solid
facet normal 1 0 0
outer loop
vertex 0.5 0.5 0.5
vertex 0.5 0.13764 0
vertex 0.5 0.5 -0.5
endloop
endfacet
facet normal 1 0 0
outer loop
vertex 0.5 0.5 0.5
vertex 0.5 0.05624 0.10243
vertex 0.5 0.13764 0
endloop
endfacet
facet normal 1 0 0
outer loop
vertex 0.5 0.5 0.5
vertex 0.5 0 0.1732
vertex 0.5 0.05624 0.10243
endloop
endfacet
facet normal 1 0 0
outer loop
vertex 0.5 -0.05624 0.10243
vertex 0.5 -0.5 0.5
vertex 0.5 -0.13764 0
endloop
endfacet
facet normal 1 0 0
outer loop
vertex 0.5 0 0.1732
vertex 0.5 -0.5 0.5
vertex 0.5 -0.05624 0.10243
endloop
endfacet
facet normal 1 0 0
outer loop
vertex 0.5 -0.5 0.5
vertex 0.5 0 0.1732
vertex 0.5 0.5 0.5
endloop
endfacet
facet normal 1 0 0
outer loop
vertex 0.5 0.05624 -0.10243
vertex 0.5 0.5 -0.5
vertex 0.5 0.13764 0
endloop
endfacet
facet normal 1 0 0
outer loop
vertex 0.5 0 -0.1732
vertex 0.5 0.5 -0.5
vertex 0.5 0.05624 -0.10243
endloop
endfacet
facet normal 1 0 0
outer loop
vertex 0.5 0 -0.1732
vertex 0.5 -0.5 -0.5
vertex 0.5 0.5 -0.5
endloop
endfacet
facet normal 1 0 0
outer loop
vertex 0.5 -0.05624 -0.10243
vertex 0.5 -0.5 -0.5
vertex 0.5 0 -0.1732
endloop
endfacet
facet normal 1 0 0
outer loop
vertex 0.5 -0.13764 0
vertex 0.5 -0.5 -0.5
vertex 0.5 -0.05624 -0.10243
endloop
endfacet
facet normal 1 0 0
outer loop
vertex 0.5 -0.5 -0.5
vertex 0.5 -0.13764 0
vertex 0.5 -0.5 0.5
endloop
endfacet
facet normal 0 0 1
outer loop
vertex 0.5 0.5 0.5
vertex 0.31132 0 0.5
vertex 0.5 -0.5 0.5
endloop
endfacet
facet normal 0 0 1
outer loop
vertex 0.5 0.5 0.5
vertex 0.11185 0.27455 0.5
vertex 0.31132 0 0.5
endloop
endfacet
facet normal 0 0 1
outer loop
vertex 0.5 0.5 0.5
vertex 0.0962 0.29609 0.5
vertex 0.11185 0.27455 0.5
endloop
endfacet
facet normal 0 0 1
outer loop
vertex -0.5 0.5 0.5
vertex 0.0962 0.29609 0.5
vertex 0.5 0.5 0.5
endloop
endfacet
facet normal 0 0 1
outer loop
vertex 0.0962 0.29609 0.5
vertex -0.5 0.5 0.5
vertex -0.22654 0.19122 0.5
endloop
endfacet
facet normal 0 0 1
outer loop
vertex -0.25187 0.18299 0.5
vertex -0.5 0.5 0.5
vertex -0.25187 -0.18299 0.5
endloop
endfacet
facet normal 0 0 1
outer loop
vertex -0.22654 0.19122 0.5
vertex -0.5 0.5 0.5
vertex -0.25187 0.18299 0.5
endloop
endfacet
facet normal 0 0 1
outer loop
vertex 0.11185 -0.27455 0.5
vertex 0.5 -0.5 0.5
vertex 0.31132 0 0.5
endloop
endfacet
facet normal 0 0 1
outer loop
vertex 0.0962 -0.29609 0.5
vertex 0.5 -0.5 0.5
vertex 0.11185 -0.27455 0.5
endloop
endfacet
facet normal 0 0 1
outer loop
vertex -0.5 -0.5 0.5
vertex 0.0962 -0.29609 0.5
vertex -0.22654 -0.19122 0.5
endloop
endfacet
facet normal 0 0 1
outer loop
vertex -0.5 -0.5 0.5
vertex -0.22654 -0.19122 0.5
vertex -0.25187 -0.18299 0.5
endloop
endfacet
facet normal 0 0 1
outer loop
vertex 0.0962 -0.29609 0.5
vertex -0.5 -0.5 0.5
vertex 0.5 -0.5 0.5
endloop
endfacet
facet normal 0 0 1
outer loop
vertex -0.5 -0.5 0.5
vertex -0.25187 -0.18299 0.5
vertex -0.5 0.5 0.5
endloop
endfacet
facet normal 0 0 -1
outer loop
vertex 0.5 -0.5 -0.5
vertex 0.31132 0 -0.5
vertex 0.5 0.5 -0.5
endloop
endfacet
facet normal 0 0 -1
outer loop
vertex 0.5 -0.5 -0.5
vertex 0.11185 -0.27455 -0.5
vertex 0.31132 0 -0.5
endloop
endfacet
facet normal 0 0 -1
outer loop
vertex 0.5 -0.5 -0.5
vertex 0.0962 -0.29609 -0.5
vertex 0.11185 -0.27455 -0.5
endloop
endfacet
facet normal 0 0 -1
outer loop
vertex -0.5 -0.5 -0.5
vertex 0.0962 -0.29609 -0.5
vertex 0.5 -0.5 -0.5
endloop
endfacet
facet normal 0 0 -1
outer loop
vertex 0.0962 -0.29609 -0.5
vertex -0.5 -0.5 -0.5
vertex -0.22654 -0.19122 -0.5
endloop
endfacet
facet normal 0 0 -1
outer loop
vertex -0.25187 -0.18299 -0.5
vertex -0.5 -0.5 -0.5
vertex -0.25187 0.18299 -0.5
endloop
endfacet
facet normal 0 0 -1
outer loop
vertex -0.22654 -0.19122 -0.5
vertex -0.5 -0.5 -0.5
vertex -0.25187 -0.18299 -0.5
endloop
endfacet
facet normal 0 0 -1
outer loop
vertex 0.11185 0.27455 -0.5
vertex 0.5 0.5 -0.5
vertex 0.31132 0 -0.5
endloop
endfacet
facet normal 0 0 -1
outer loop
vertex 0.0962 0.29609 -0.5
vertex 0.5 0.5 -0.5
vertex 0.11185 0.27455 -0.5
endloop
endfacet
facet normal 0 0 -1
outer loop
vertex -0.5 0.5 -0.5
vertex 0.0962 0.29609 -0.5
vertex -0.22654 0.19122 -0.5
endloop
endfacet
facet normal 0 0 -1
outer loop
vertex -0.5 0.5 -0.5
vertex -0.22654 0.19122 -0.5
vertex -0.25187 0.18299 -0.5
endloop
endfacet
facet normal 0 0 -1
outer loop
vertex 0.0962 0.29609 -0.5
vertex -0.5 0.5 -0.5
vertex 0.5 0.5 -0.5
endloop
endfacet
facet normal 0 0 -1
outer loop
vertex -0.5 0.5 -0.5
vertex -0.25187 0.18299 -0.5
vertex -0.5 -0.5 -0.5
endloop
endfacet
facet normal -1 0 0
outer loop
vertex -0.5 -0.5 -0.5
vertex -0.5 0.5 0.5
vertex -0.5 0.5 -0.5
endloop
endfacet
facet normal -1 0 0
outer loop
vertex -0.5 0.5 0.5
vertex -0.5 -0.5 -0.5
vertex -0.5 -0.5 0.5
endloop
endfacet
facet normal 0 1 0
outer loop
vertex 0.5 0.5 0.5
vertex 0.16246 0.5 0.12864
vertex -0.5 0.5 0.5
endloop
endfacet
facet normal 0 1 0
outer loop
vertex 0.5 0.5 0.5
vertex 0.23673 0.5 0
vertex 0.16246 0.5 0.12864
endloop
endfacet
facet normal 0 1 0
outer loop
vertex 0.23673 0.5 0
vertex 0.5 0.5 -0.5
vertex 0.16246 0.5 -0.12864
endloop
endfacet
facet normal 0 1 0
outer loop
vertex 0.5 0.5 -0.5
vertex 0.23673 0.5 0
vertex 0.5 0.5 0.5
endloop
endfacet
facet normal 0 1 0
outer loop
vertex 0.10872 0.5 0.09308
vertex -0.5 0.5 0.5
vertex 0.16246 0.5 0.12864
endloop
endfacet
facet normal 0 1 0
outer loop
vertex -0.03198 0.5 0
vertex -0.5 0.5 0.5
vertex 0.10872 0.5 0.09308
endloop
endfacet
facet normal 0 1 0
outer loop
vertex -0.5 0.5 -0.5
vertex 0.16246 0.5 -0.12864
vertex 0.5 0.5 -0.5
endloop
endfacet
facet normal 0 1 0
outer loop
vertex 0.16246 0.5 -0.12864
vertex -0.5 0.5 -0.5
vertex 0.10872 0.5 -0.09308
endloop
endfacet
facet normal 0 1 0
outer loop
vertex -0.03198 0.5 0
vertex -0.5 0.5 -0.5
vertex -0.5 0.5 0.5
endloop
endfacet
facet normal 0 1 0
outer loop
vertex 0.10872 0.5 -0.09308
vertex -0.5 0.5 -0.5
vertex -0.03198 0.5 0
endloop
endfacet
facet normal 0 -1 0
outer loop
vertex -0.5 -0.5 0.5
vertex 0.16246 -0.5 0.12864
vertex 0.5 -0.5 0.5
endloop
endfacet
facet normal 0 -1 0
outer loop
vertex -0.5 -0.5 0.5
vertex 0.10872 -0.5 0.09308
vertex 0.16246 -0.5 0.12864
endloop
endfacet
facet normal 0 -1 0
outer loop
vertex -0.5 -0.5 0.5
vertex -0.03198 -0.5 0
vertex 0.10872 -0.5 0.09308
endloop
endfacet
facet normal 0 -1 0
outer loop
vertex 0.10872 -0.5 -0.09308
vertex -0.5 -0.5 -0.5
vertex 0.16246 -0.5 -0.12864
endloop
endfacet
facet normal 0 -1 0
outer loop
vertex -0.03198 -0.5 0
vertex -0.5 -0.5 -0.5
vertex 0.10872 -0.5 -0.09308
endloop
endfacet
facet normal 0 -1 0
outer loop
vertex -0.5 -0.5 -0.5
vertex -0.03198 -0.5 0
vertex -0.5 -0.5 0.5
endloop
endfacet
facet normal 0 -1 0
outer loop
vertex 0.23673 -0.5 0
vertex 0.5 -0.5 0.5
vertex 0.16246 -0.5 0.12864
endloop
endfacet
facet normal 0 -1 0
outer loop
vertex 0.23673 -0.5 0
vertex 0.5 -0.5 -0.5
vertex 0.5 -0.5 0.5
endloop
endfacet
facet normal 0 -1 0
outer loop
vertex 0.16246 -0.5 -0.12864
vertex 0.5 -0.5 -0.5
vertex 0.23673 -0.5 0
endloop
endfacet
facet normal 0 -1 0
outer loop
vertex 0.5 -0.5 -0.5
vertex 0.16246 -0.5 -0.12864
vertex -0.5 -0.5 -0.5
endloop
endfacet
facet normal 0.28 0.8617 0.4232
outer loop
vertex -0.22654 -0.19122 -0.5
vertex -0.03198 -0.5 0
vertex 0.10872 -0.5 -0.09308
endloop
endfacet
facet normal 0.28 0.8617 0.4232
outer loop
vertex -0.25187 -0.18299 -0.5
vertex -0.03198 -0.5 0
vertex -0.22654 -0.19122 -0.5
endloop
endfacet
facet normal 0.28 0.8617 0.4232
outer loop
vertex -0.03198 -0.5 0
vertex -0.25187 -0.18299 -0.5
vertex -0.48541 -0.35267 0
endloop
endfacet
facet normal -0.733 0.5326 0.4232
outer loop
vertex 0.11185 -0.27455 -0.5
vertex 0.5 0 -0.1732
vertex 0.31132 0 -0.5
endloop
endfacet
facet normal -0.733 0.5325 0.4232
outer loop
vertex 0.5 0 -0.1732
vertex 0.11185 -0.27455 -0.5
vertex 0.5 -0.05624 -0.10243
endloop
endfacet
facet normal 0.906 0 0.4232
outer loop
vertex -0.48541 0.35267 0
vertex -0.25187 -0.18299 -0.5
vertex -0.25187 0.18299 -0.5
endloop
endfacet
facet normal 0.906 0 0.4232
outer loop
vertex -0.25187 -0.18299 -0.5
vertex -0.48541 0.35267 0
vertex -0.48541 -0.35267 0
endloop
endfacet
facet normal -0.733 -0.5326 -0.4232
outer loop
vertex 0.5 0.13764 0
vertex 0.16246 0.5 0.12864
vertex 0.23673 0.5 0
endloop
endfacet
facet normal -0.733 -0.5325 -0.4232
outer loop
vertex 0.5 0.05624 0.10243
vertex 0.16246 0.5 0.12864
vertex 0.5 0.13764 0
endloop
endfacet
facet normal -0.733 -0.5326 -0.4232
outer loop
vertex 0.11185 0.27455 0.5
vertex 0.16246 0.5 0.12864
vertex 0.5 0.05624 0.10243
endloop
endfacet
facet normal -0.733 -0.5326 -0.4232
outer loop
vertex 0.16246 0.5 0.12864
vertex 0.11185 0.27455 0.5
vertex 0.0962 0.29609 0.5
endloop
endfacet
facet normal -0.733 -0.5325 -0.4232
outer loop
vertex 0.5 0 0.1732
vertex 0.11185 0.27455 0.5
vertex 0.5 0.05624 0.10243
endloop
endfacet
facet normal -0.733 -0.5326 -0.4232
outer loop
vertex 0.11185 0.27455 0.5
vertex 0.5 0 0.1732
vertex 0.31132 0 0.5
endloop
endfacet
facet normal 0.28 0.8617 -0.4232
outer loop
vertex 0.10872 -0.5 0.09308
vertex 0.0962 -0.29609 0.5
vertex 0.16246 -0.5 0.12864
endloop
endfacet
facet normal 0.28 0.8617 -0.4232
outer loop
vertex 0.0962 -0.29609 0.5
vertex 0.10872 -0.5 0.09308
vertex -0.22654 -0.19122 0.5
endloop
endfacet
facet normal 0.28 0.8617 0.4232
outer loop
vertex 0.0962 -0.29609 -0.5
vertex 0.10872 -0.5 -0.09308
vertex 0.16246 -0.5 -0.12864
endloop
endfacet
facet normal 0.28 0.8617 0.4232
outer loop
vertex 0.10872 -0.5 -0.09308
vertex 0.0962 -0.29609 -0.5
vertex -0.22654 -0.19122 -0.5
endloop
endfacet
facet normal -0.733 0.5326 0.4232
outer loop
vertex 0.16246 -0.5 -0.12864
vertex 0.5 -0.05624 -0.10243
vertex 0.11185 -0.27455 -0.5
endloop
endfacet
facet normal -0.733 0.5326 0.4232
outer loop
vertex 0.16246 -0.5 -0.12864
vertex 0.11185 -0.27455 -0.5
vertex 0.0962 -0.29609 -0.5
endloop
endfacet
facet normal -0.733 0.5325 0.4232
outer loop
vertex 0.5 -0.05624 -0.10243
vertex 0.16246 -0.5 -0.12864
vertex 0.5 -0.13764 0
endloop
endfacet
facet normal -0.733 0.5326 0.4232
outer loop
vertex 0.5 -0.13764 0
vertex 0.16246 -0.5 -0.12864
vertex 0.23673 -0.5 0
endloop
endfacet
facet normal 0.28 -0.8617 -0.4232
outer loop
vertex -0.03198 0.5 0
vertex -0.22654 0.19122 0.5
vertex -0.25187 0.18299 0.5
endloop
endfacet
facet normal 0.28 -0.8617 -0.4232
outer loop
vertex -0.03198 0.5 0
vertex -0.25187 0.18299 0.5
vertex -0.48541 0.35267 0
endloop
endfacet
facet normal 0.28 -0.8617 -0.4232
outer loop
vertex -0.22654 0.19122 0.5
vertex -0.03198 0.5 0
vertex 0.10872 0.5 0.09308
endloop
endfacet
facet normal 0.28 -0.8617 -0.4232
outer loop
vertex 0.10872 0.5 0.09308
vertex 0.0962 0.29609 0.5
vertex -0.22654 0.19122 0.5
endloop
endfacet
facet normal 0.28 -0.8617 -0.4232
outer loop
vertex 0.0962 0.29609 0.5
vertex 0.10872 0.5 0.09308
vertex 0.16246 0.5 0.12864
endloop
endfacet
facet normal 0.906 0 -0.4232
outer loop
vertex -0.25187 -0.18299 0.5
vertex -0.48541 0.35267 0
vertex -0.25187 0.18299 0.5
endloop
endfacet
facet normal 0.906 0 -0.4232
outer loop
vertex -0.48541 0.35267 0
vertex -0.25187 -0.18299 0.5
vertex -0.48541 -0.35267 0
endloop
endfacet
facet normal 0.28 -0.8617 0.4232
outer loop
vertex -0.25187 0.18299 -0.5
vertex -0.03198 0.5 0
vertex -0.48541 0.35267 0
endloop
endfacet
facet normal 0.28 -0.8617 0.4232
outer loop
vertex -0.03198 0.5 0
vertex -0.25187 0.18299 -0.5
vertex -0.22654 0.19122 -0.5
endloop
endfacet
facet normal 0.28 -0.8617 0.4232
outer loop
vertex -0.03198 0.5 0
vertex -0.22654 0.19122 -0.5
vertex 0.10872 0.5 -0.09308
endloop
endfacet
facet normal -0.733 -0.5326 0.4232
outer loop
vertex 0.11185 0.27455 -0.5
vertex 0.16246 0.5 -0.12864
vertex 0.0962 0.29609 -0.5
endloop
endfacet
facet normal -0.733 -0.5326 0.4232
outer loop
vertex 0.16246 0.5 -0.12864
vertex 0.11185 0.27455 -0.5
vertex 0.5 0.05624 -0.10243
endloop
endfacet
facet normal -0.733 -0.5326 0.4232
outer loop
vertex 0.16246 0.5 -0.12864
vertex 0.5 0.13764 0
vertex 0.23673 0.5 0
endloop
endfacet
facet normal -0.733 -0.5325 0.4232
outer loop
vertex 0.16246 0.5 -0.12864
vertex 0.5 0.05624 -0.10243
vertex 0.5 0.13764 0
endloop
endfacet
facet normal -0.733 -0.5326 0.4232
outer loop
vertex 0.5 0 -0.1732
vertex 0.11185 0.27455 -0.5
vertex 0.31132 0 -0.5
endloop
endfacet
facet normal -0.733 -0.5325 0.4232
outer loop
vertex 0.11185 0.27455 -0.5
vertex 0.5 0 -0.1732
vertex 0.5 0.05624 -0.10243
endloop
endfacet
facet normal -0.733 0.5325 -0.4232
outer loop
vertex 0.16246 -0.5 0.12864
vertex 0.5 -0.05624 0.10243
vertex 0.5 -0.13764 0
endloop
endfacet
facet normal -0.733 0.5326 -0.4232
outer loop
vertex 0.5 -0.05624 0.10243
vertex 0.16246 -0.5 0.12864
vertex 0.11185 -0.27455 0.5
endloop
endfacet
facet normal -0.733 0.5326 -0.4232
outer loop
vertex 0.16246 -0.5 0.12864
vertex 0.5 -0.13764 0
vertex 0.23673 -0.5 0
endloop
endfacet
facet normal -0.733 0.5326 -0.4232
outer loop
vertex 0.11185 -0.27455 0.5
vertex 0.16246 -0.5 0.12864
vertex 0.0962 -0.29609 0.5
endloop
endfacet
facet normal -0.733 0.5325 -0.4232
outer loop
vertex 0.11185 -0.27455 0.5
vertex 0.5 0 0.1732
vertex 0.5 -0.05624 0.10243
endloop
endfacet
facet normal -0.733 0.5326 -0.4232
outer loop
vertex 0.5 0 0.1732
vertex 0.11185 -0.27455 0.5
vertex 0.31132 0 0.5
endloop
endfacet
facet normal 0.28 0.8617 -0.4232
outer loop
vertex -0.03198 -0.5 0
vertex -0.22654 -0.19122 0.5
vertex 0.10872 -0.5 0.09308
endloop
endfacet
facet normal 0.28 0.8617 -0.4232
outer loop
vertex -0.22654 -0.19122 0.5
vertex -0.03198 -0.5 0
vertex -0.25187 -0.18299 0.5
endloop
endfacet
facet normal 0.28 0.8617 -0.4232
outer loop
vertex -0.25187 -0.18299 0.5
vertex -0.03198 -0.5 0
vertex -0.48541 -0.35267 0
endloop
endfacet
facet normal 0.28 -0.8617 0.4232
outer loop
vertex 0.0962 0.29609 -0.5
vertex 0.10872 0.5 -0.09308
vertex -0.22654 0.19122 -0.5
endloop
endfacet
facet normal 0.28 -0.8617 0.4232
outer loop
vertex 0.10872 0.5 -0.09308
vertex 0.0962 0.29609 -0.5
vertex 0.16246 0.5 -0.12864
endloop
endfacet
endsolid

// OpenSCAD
difference() {
    cube(1, center=true);
    sphere(0.6);
}
